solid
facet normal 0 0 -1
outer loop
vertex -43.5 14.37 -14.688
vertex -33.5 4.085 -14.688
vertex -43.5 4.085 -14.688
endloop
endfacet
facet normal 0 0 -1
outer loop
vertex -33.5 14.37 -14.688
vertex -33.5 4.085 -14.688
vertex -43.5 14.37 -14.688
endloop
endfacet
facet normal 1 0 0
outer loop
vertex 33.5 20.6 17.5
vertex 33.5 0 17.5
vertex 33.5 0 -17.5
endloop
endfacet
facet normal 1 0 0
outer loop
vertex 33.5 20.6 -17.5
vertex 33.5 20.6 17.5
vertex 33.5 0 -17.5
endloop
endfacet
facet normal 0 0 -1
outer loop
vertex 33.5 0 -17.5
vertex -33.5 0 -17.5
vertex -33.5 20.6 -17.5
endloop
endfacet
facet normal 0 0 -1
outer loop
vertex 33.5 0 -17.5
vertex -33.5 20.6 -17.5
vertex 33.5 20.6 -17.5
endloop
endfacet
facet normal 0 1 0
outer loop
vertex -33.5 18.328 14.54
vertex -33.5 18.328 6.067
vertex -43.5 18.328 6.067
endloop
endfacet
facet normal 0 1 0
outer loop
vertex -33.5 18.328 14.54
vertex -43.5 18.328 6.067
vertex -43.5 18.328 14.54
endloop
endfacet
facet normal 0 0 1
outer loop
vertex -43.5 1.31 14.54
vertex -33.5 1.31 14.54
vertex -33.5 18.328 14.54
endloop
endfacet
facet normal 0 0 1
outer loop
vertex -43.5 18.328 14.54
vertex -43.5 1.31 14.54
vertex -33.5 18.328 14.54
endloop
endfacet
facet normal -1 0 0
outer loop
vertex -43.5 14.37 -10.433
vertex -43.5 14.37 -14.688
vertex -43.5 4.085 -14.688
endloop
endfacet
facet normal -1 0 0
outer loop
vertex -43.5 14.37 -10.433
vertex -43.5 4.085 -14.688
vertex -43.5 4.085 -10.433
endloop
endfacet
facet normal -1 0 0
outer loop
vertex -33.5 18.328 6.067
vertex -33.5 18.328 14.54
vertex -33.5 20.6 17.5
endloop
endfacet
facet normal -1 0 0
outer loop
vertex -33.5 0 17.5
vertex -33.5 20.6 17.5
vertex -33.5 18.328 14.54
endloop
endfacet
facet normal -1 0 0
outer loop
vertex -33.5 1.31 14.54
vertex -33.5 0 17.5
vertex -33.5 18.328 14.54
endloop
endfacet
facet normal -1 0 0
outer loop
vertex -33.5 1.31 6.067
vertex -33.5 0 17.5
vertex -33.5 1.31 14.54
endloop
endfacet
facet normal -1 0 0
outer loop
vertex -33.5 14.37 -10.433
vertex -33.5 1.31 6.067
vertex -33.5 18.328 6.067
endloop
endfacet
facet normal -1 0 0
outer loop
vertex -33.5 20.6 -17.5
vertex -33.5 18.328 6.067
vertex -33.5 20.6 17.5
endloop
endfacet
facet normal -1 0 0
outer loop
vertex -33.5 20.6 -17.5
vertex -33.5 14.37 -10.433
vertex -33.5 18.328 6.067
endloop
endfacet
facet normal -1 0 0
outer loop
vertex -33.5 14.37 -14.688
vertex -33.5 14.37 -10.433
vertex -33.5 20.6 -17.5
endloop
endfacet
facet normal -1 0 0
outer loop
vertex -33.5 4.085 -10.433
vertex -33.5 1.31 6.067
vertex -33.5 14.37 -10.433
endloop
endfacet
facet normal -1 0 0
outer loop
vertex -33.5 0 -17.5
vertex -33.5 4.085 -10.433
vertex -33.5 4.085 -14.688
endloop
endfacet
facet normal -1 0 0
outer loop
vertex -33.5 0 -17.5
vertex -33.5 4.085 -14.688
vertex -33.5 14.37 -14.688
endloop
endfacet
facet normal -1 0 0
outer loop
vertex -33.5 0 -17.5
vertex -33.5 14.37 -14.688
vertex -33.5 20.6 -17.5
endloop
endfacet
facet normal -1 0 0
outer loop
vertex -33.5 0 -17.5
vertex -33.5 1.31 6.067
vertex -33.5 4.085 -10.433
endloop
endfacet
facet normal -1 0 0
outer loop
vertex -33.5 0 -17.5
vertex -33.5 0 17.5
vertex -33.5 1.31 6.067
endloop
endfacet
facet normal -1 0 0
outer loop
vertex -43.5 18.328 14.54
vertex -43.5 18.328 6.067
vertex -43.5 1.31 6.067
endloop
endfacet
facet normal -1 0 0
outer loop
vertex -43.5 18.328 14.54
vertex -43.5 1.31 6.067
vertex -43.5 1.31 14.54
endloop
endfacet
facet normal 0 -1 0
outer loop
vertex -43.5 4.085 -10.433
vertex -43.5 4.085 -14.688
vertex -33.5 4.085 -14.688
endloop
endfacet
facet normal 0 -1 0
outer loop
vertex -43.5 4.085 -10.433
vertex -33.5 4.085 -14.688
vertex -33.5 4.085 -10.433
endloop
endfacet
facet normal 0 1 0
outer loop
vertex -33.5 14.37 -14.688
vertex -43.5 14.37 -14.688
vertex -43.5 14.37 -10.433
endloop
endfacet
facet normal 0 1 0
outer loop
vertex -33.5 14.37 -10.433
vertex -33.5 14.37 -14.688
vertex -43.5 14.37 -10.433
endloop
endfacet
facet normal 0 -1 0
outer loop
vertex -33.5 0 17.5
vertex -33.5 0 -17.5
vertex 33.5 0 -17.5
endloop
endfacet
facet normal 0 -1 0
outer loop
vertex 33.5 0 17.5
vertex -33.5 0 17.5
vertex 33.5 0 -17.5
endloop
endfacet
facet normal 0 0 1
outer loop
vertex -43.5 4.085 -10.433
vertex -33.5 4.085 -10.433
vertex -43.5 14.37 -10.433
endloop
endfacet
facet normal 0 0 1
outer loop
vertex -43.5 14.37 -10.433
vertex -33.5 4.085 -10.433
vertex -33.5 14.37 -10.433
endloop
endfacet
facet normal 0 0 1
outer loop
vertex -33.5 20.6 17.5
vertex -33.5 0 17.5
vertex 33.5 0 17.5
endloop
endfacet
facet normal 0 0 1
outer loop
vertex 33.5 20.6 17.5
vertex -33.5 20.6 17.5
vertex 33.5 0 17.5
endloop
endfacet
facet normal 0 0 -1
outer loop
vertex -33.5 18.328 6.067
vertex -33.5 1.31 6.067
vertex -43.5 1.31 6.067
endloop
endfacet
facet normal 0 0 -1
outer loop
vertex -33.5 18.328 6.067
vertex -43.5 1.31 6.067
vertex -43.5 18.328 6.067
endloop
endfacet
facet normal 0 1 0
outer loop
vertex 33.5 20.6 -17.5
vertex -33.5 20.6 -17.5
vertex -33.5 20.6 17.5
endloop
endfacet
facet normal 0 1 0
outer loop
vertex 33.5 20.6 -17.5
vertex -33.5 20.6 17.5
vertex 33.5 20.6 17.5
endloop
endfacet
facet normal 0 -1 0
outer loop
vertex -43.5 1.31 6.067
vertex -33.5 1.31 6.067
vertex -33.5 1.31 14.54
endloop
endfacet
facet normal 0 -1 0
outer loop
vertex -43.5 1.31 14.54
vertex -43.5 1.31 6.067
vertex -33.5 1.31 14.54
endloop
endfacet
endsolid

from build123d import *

# Parameters (mm, degrees)
SKETCH1_W           = 67
SKETCH1_H           = 35
BOSS_EXTRUDE1_DEPTH = 20.6
SKETCH2_W           = 4.254648544
SKETCH2_H           = 10.285150392
SKETCH2_W_2         = 8.472300143
SKETCH2_H_2         = 17.018594174
BOSS_EXTRUDE2_DEPTH = 10


with BuildPart() as part:
    # Sketch1 → Boss-Extrude1 (new body)
    with BuildSketch(Plane(origin=(0, 0, 0), x_dir=(1, 0, 0), z_dir=(0, 1, 0))):
        Rectangle(SKETCH1_W, SKETCH1_H)
    extrude(amount=BOSS_EXTRUDE1_DEPTH)

    # Sketch2 → Boss-Extrude2 (add)
    with BuildSketch(Plane.ZY.offset(33.5)):
        with Locations((-12.560462439, 9.227088628)):
            Rectangle(SKETCH2_W, SKETCH2_H)
        with Locations((10.303648864, 9.81903973)):
            Rectangle(SKETCH2_W_2, SKETCH2_H_2)
    extrude(amount=BOSS_EXTRUDE2_DEPTH)


solid = part.part
